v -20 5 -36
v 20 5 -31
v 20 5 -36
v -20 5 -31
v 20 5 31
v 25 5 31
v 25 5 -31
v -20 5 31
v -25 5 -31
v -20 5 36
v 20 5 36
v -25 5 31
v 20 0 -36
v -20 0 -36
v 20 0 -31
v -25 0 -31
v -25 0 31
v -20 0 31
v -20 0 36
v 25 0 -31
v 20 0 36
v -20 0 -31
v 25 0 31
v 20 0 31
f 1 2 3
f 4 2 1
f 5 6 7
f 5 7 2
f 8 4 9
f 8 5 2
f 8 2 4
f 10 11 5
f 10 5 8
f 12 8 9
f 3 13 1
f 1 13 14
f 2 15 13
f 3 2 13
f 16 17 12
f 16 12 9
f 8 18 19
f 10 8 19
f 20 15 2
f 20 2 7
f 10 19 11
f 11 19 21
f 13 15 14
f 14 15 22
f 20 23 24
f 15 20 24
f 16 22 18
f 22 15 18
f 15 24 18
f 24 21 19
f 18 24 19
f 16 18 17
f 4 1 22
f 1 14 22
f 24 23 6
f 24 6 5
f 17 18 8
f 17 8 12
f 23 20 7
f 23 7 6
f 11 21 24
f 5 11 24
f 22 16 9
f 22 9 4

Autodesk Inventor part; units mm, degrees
ref_plane "YZ Plane" through (0, 0, 0) normal (1, 0, 0) x (0, 1, 0)
ref_plane "XZ Plane" through (0, 0, 0) normal (0, 1, 0) x (-1, 0, 0)
ref_plane "XY Plane" through (0, 0, 0) normal (0, 0, 1) x (1, 0, 0)
sketch "Sketch1" plane through (0, 0, 0) normal (0, 1, 0) x (-1, 0, 0)
  line L0 (25, -31) -> (-25, -31)
  line L1 (-25, -31) -> (-25, 31)
  line L2 (-25, 31) -> (25, 31)
  line L3 (25, 31) -> (25, -31)
  line L4 (25, -31) -> (-25, 31) construction
  line L5 (-25, -31) -> (25, 31) construction
  line L6 (-20, -36) -> (20, -36)
  line L7 (20, -36) -> (20, -31)
  line L8 (20, -31) -> (-20, -31)
  line L9 (-20, -31) -> (-20, -36)
  line L10 (-20, -36) -> (20, -31) construction
  line L11 (20, -36) -> (-20, -31) construction
  line L12 (-20, 31) -> (20, 31)
  line L13 (20, 31) -> (20, 36)
  line L14 (20, 36) -> (-20, 36)
  line L15 (-20, 36) -> (-20, 31)
  line L16 (-20, 31) -> (20, 36) construction
  line L17 (20, 31) -> (-20, 36) construction
  line L18 (0, 0) -> (0, -31) construction
  line L19 (0, -33.5) -> (0, -36) construction
  line L20 (0, 33.5) -> (0, 31) construction
  point P0 (-20, 31)
  point P1 (-20, -31)
  point P2 (20, -31)
  point P3 (20, 31)
  dimension "d0" = 5
  dimension "d1" = 5
  dimension "d2" = 40
  dimension "d3" = 40
  dimension "d4" = 62
  dimension "d5" = 50
extrude "Extrusion1" add sketch "Sketch1" along normal blind 5
properties part number "Base Plate Wall" material "PLA 33 Plastic"
